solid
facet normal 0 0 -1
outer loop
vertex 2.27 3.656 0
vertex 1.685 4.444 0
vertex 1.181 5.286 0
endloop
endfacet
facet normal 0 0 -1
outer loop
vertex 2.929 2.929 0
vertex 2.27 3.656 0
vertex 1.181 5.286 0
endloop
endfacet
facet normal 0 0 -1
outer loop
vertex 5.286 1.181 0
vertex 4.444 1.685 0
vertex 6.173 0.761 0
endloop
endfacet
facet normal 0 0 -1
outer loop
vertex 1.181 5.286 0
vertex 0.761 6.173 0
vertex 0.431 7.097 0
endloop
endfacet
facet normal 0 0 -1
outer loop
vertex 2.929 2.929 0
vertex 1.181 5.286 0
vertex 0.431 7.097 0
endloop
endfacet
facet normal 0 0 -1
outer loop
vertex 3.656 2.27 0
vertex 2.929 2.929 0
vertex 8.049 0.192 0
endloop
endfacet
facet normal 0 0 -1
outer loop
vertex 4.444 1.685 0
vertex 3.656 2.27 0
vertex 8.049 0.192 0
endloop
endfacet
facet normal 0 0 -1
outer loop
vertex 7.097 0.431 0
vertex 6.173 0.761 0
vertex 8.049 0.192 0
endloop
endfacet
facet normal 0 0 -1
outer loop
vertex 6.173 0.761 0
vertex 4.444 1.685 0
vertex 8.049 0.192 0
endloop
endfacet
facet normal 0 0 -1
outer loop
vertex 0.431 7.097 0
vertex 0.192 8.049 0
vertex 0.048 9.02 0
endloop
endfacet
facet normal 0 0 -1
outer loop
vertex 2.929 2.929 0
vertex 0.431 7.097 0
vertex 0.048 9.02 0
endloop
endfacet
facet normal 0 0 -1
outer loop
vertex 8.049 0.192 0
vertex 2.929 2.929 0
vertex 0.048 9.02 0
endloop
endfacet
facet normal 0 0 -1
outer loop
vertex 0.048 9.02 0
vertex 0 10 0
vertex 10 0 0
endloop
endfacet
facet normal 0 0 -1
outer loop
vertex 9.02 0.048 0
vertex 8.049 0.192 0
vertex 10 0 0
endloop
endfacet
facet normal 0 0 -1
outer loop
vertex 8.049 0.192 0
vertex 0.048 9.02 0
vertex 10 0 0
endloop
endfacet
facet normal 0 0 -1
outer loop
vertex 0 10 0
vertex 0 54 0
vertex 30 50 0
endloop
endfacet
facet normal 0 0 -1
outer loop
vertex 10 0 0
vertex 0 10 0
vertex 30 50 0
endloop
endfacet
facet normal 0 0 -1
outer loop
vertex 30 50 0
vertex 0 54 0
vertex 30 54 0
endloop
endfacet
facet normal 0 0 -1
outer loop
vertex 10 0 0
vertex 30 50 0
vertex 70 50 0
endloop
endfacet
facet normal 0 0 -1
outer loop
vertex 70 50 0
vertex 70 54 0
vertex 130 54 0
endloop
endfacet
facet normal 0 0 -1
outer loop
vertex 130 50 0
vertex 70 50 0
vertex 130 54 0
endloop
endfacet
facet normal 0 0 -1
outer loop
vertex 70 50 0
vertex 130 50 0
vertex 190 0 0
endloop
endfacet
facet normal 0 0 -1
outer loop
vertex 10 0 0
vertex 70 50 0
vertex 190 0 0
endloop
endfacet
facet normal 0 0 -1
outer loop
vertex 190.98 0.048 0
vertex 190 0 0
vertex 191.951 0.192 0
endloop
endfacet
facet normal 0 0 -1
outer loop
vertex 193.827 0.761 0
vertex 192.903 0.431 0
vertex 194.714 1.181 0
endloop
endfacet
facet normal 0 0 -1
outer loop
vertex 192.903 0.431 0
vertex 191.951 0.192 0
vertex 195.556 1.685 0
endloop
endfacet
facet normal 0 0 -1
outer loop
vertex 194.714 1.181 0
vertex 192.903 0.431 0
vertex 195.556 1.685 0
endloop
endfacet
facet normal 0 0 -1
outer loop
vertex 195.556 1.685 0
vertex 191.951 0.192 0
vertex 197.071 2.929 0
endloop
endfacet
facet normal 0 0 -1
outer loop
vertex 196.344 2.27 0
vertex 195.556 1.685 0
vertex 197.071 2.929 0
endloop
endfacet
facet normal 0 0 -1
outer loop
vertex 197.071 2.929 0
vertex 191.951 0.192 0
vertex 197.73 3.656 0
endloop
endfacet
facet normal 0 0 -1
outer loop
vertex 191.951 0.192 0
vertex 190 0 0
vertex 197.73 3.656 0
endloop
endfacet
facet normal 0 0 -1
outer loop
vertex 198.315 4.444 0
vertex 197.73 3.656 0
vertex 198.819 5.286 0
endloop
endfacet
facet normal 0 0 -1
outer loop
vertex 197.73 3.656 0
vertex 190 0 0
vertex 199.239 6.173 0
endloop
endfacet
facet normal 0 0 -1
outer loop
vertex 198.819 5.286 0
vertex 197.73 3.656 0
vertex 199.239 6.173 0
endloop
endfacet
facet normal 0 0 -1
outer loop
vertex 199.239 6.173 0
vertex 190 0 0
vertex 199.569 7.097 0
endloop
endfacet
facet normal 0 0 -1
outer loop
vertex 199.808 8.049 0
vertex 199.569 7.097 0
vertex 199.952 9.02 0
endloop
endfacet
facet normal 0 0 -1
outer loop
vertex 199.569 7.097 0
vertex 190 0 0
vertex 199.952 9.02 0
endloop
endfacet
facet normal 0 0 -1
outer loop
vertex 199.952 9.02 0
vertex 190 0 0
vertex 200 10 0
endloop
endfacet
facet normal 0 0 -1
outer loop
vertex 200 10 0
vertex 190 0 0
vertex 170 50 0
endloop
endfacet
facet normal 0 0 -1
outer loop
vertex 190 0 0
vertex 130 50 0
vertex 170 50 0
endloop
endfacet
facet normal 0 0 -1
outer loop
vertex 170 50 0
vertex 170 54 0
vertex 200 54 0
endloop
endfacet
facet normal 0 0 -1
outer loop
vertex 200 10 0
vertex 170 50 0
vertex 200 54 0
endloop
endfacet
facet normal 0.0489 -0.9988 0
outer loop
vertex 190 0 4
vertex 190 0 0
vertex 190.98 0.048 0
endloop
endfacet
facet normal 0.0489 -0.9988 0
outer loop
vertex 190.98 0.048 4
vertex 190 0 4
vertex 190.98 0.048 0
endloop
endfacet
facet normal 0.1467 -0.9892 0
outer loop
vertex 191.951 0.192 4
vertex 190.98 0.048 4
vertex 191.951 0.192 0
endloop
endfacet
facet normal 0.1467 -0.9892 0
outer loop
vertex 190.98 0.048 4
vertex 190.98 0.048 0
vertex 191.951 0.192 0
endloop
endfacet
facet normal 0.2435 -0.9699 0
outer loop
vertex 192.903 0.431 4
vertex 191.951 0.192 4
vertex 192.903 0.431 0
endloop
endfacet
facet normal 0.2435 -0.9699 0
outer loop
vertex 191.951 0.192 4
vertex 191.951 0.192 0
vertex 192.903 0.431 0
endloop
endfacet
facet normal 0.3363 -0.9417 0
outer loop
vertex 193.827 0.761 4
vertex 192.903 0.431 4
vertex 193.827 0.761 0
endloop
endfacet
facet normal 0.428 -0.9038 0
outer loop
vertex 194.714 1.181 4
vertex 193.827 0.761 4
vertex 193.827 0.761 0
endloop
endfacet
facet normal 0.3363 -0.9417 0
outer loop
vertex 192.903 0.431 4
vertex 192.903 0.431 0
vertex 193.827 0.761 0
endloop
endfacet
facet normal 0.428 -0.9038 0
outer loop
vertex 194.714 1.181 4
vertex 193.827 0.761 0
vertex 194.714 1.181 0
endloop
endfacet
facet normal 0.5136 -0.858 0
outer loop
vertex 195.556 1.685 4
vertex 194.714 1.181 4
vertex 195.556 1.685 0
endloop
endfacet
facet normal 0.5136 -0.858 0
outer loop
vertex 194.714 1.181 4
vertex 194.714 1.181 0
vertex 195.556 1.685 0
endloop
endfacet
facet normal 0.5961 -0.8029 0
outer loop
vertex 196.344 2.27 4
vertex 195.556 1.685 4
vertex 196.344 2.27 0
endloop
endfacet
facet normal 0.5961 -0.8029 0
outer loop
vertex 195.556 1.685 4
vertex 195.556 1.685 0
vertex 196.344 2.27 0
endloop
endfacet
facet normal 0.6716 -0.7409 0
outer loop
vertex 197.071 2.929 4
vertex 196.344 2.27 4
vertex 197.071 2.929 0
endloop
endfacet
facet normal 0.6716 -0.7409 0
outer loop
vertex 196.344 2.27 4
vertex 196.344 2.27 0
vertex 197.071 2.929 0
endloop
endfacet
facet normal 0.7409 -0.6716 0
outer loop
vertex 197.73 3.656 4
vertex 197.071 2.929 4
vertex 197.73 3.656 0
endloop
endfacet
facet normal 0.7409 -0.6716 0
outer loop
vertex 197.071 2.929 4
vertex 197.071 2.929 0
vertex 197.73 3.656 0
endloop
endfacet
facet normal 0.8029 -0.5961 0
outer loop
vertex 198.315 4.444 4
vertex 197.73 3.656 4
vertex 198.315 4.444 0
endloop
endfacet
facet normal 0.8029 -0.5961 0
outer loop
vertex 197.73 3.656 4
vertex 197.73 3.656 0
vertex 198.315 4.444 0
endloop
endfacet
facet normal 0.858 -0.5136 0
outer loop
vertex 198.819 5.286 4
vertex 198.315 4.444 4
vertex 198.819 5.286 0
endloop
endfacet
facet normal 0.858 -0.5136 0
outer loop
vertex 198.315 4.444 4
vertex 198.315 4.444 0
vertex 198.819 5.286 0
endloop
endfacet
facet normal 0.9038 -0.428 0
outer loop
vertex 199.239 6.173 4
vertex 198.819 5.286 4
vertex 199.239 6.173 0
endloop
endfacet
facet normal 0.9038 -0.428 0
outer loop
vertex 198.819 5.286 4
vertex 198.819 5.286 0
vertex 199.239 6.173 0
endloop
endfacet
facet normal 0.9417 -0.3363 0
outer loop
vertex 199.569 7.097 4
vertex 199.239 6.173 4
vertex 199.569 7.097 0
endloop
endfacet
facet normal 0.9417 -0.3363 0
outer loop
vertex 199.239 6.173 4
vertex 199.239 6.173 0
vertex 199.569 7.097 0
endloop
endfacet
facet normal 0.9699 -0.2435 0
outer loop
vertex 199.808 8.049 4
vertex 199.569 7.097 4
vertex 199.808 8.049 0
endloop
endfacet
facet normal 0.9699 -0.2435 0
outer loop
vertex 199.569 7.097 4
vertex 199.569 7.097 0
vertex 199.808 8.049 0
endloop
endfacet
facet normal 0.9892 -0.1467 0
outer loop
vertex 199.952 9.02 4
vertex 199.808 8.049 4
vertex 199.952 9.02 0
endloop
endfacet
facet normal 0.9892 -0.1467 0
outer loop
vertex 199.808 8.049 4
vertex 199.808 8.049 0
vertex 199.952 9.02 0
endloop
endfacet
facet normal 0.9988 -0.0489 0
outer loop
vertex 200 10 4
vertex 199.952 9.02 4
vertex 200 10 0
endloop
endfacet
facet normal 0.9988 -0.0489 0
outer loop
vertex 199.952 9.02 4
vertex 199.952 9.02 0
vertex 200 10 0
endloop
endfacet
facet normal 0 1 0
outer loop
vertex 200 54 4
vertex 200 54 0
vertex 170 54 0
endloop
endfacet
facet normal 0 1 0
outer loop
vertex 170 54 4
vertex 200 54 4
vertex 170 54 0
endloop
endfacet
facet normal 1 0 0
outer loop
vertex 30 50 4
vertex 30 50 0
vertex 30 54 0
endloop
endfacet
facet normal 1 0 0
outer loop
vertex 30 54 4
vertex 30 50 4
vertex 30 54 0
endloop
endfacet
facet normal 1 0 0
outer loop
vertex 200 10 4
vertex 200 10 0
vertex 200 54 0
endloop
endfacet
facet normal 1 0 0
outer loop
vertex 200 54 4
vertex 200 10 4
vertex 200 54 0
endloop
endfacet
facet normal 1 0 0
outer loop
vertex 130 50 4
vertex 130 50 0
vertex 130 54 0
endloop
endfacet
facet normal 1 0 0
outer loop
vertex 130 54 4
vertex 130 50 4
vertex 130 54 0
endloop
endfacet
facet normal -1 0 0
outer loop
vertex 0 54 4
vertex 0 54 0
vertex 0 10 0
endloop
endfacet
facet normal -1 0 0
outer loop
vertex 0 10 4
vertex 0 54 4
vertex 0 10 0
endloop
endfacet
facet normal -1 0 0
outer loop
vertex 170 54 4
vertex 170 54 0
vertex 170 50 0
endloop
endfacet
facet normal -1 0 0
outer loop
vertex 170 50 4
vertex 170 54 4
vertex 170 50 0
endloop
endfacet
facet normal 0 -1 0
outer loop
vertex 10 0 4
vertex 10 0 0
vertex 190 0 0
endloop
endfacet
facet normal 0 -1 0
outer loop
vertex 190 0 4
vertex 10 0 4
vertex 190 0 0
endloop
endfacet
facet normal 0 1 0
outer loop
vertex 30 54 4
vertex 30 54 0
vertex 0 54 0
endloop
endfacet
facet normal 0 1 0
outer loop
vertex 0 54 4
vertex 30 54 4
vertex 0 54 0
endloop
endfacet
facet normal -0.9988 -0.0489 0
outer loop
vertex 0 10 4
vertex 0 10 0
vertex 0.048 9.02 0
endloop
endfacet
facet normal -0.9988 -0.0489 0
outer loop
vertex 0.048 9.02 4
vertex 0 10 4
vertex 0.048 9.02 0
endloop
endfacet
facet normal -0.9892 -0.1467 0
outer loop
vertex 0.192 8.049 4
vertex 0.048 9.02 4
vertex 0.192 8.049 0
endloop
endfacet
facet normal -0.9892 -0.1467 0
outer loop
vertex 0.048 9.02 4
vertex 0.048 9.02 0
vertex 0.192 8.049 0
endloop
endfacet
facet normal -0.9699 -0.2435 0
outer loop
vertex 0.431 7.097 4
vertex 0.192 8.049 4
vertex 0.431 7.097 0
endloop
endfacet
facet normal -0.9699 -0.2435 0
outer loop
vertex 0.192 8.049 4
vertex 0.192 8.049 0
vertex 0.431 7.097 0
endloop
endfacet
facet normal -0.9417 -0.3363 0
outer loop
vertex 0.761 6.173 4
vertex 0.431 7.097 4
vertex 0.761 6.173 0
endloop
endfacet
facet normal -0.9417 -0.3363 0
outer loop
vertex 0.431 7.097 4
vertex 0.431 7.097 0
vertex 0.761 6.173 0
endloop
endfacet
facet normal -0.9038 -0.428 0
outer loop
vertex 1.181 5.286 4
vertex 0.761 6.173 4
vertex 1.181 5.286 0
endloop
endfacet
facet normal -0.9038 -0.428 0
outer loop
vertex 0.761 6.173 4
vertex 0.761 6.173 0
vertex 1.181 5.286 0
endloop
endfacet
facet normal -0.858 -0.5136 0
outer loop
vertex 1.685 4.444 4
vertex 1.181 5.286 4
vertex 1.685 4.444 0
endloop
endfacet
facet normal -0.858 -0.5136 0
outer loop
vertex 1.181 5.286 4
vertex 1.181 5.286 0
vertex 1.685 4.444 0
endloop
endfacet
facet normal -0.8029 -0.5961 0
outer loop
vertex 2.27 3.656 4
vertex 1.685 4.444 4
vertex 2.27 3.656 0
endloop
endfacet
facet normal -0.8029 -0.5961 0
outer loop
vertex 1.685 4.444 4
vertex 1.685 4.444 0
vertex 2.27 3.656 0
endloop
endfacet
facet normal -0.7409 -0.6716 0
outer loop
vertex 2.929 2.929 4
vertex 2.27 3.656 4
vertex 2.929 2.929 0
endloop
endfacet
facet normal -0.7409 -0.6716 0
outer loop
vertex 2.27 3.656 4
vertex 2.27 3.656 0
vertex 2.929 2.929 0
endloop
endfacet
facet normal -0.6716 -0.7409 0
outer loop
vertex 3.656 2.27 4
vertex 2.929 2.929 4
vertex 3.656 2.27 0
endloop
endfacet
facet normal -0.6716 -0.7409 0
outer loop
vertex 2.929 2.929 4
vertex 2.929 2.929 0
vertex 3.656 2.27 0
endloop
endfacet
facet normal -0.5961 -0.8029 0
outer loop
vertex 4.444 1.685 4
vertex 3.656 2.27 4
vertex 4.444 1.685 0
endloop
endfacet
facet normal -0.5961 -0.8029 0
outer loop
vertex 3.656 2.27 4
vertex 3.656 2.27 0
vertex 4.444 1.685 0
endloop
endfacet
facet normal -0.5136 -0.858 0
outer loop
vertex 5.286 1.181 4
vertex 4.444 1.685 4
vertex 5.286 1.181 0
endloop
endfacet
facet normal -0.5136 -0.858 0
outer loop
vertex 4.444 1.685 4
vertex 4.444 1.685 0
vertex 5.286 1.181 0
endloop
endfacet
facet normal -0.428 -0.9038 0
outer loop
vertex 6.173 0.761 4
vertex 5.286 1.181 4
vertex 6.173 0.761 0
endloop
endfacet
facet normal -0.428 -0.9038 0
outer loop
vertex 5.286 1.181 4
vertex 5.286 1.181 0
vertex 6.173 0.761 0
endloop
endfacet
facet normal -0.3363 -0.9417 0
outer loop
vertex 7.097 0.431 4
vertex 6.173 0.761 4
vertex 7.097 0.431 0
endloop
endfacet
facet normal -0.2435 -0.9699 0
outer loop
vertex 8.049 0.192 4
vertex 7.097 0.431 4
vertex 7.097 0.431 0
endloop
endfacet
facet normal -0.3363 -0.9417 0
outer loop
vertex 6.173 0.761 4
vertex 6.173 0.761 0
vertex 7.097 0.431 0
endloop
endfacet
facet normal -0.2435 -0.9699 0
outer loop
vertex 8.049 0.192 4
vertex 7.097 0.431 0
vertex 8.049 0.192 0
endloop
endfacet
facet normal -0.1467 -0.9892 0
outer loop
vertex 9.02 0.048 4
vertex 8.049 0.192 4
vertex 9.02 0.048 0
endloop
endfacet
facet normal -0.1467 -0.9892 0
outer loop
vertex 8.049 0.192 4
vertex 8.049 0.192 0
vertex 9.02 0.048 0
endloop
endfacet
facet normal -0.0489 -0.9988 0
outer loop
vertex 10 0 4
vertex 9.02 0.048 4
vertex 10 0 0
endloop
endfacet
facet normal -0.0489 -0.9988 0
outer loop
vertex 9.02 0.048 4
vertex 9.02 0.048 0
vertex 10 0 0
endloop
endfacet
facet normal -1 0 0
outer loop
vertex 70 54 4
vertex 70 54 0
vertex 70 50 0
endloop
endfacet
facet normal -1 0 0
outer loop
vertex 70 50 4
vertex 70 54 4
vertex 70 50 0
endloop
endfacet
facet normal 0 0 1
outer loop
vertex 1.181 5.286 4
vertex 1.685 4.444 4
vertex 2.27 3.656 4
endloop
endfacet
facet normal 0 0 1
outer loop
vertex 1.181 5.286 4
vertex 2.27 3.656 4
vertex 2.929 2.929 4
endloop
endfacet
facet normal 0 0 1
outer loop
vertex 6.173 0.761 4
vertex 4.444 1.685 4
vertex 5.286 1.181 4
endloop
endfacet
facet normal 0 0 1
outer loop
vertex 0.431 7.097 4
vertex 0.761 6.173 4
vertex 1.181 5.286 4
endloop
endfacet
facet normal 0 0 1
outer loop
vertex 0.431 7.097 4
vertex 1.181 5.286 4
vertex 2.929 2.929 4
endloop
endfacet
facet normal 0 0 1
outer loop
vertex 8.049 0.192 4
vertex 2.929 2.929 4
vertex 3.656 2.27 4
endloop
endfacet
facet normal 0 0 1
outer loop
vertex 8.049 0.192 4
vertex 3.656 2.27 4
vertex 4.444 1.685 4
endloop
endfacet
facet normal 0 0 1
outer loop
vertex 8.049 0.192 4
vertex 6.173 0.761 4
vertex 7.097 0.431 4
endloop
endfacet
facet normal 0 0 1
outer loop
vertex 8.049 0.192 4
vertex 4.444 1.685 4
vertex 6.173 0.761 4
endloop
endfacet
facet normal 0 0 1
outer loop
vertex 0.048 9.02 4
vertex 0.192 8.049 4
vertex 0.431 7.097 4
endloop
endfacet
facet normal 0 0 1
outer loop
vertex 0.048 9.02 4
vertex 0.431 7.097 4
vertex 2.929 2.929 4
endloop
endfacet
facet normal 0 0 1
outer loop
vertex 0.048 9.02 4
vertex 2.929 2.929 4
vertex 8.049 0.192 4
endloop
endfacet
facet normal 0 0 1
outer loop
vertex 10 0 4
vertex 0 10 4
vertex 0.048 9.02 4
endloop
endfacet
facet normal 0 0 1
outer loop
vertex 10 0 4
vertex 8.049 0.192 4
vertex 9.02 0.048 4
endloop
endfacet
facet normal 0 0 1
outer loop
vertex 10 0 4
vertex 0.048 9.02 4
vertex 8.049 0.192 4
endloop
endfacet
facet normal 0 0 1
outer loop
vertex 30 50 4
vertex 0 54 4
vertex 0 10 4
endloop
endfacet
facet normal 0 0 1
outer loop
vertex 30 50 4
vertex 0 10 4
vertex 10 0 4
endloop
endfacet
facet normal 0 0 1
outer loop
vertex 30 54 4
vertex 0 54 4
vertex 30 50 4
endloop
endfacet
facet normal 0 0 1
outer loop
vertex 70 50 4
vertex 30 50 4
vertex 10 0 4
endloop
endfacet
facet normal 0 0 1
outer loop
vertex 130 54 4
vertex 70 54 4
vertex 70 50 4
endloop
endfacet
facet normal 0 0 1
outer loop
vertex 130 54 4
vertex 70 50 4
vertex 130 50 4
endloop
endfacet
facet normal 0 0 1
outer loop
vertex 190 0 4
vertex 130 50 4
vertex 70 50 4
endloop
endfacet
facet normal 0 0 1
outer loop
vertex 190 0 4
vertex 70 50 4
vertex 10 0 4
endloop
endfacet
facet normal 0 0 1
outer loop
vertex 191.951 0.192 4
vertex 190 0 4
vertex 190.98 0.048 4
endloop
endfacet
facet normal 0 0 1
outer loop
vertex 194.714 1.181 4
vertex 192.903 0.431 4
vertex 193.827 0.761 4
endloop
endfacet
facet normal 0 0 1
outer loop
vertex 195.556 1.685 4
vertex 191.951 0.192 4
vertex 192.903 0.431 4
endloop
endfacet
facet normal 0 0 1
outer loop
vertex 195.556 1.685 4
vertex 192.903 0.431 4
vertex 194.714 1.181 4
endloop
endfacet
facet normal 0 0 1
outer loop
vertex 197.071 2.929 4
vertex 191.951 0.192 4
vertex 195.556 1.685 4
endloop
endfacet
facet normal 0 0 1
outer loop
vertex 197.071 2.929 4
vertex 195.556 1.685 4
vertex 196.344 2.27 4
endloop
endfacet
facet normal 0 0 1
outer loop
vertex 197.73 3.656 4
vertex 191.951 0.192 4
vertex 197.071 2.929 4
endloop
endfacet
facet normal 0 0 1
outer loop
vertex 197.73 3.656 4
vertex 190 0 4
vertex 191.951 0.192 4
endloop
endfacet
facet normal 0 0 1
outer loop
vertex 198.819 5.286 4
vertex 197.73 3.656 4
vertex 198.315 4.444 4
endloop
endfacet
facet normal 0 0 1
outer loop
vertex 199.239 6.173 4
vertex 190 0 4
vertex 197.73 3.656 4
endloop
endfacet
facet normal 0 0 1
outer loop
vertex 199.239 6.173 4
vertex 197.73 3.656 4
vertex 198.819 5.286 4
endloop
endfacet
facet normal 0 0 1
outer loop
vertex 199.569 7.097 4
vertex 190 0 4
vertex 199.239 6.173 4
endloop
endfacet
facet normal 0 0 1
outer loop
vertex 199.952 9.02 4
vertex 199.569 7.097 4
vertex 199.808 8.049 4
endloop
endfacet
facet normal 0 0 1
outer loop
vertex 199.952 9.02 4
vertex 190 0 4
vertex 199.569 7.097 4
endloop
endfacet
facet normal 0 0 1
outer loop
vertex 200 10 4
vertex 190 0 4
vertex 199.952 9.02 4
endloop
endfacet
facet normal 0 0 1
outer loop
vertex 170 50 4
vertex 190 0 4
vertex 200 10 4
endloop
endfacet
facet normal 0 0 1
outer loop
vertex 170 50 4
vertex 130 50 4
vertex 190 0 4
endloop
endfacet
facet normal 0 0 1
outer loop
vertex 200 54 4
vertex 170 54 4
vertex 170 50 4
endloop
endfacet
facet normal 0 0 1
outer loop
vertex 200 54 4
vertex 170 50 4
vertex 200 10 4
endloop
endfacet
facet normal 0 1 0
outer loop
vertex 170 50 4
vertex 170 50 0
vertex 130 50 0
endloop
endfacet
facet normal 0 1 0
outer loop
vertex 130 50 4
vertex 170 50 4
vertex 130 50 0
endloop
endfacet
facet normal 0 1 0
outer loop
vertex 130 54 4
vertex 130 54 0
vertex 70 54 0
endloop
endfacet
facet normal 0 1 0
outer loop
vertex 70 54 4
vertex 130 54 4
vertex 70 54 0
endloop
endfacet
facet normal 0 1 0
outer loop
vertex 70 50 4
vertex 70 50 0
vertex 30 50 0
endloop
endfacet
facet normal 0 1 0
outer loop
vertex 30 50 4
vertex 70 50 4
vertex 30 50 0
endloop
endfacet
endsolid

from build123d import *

# Parameters (mm, degrees)
BOSS_EXTRUDE1_DEPTH = 4


with BuildPart() as part:
    # Sketch1 → Boss-Extrude1 (new body)
    with BuildSketch(Plane.XY):
        with BuildLine():
            Line((10, 0), (190, 0))
            ThreePointArc((190, 0), (197.071067812, 2.928932188), (200, 10))
            Line((200, 10), (200, 50))
            Line((200, 50), (200, 54))
            Line((200, 54), (170, 54))
            Line((170, 54), (170, 50))
            Line((170, 50), (130, 50))
            Line((130, 50), (130, 54))
            Line((130, 54), (70, 54))
            Line((70, 54), (70, 50))
            Line((70, 50), (30, 50))
            Line((30, 50), (30, 54))
            Line((30, 54), (0, 54))
            Line((0, 54), (0, 50))
            Line((0, 50), (0, 10))
            ThreePointArc((0, 10), (2.928932188, 2.928932188), (10, 0))
        make_face()
    extrude(amount=BOSS_EXTRUDE1_DEPTH)


solid = part.part
